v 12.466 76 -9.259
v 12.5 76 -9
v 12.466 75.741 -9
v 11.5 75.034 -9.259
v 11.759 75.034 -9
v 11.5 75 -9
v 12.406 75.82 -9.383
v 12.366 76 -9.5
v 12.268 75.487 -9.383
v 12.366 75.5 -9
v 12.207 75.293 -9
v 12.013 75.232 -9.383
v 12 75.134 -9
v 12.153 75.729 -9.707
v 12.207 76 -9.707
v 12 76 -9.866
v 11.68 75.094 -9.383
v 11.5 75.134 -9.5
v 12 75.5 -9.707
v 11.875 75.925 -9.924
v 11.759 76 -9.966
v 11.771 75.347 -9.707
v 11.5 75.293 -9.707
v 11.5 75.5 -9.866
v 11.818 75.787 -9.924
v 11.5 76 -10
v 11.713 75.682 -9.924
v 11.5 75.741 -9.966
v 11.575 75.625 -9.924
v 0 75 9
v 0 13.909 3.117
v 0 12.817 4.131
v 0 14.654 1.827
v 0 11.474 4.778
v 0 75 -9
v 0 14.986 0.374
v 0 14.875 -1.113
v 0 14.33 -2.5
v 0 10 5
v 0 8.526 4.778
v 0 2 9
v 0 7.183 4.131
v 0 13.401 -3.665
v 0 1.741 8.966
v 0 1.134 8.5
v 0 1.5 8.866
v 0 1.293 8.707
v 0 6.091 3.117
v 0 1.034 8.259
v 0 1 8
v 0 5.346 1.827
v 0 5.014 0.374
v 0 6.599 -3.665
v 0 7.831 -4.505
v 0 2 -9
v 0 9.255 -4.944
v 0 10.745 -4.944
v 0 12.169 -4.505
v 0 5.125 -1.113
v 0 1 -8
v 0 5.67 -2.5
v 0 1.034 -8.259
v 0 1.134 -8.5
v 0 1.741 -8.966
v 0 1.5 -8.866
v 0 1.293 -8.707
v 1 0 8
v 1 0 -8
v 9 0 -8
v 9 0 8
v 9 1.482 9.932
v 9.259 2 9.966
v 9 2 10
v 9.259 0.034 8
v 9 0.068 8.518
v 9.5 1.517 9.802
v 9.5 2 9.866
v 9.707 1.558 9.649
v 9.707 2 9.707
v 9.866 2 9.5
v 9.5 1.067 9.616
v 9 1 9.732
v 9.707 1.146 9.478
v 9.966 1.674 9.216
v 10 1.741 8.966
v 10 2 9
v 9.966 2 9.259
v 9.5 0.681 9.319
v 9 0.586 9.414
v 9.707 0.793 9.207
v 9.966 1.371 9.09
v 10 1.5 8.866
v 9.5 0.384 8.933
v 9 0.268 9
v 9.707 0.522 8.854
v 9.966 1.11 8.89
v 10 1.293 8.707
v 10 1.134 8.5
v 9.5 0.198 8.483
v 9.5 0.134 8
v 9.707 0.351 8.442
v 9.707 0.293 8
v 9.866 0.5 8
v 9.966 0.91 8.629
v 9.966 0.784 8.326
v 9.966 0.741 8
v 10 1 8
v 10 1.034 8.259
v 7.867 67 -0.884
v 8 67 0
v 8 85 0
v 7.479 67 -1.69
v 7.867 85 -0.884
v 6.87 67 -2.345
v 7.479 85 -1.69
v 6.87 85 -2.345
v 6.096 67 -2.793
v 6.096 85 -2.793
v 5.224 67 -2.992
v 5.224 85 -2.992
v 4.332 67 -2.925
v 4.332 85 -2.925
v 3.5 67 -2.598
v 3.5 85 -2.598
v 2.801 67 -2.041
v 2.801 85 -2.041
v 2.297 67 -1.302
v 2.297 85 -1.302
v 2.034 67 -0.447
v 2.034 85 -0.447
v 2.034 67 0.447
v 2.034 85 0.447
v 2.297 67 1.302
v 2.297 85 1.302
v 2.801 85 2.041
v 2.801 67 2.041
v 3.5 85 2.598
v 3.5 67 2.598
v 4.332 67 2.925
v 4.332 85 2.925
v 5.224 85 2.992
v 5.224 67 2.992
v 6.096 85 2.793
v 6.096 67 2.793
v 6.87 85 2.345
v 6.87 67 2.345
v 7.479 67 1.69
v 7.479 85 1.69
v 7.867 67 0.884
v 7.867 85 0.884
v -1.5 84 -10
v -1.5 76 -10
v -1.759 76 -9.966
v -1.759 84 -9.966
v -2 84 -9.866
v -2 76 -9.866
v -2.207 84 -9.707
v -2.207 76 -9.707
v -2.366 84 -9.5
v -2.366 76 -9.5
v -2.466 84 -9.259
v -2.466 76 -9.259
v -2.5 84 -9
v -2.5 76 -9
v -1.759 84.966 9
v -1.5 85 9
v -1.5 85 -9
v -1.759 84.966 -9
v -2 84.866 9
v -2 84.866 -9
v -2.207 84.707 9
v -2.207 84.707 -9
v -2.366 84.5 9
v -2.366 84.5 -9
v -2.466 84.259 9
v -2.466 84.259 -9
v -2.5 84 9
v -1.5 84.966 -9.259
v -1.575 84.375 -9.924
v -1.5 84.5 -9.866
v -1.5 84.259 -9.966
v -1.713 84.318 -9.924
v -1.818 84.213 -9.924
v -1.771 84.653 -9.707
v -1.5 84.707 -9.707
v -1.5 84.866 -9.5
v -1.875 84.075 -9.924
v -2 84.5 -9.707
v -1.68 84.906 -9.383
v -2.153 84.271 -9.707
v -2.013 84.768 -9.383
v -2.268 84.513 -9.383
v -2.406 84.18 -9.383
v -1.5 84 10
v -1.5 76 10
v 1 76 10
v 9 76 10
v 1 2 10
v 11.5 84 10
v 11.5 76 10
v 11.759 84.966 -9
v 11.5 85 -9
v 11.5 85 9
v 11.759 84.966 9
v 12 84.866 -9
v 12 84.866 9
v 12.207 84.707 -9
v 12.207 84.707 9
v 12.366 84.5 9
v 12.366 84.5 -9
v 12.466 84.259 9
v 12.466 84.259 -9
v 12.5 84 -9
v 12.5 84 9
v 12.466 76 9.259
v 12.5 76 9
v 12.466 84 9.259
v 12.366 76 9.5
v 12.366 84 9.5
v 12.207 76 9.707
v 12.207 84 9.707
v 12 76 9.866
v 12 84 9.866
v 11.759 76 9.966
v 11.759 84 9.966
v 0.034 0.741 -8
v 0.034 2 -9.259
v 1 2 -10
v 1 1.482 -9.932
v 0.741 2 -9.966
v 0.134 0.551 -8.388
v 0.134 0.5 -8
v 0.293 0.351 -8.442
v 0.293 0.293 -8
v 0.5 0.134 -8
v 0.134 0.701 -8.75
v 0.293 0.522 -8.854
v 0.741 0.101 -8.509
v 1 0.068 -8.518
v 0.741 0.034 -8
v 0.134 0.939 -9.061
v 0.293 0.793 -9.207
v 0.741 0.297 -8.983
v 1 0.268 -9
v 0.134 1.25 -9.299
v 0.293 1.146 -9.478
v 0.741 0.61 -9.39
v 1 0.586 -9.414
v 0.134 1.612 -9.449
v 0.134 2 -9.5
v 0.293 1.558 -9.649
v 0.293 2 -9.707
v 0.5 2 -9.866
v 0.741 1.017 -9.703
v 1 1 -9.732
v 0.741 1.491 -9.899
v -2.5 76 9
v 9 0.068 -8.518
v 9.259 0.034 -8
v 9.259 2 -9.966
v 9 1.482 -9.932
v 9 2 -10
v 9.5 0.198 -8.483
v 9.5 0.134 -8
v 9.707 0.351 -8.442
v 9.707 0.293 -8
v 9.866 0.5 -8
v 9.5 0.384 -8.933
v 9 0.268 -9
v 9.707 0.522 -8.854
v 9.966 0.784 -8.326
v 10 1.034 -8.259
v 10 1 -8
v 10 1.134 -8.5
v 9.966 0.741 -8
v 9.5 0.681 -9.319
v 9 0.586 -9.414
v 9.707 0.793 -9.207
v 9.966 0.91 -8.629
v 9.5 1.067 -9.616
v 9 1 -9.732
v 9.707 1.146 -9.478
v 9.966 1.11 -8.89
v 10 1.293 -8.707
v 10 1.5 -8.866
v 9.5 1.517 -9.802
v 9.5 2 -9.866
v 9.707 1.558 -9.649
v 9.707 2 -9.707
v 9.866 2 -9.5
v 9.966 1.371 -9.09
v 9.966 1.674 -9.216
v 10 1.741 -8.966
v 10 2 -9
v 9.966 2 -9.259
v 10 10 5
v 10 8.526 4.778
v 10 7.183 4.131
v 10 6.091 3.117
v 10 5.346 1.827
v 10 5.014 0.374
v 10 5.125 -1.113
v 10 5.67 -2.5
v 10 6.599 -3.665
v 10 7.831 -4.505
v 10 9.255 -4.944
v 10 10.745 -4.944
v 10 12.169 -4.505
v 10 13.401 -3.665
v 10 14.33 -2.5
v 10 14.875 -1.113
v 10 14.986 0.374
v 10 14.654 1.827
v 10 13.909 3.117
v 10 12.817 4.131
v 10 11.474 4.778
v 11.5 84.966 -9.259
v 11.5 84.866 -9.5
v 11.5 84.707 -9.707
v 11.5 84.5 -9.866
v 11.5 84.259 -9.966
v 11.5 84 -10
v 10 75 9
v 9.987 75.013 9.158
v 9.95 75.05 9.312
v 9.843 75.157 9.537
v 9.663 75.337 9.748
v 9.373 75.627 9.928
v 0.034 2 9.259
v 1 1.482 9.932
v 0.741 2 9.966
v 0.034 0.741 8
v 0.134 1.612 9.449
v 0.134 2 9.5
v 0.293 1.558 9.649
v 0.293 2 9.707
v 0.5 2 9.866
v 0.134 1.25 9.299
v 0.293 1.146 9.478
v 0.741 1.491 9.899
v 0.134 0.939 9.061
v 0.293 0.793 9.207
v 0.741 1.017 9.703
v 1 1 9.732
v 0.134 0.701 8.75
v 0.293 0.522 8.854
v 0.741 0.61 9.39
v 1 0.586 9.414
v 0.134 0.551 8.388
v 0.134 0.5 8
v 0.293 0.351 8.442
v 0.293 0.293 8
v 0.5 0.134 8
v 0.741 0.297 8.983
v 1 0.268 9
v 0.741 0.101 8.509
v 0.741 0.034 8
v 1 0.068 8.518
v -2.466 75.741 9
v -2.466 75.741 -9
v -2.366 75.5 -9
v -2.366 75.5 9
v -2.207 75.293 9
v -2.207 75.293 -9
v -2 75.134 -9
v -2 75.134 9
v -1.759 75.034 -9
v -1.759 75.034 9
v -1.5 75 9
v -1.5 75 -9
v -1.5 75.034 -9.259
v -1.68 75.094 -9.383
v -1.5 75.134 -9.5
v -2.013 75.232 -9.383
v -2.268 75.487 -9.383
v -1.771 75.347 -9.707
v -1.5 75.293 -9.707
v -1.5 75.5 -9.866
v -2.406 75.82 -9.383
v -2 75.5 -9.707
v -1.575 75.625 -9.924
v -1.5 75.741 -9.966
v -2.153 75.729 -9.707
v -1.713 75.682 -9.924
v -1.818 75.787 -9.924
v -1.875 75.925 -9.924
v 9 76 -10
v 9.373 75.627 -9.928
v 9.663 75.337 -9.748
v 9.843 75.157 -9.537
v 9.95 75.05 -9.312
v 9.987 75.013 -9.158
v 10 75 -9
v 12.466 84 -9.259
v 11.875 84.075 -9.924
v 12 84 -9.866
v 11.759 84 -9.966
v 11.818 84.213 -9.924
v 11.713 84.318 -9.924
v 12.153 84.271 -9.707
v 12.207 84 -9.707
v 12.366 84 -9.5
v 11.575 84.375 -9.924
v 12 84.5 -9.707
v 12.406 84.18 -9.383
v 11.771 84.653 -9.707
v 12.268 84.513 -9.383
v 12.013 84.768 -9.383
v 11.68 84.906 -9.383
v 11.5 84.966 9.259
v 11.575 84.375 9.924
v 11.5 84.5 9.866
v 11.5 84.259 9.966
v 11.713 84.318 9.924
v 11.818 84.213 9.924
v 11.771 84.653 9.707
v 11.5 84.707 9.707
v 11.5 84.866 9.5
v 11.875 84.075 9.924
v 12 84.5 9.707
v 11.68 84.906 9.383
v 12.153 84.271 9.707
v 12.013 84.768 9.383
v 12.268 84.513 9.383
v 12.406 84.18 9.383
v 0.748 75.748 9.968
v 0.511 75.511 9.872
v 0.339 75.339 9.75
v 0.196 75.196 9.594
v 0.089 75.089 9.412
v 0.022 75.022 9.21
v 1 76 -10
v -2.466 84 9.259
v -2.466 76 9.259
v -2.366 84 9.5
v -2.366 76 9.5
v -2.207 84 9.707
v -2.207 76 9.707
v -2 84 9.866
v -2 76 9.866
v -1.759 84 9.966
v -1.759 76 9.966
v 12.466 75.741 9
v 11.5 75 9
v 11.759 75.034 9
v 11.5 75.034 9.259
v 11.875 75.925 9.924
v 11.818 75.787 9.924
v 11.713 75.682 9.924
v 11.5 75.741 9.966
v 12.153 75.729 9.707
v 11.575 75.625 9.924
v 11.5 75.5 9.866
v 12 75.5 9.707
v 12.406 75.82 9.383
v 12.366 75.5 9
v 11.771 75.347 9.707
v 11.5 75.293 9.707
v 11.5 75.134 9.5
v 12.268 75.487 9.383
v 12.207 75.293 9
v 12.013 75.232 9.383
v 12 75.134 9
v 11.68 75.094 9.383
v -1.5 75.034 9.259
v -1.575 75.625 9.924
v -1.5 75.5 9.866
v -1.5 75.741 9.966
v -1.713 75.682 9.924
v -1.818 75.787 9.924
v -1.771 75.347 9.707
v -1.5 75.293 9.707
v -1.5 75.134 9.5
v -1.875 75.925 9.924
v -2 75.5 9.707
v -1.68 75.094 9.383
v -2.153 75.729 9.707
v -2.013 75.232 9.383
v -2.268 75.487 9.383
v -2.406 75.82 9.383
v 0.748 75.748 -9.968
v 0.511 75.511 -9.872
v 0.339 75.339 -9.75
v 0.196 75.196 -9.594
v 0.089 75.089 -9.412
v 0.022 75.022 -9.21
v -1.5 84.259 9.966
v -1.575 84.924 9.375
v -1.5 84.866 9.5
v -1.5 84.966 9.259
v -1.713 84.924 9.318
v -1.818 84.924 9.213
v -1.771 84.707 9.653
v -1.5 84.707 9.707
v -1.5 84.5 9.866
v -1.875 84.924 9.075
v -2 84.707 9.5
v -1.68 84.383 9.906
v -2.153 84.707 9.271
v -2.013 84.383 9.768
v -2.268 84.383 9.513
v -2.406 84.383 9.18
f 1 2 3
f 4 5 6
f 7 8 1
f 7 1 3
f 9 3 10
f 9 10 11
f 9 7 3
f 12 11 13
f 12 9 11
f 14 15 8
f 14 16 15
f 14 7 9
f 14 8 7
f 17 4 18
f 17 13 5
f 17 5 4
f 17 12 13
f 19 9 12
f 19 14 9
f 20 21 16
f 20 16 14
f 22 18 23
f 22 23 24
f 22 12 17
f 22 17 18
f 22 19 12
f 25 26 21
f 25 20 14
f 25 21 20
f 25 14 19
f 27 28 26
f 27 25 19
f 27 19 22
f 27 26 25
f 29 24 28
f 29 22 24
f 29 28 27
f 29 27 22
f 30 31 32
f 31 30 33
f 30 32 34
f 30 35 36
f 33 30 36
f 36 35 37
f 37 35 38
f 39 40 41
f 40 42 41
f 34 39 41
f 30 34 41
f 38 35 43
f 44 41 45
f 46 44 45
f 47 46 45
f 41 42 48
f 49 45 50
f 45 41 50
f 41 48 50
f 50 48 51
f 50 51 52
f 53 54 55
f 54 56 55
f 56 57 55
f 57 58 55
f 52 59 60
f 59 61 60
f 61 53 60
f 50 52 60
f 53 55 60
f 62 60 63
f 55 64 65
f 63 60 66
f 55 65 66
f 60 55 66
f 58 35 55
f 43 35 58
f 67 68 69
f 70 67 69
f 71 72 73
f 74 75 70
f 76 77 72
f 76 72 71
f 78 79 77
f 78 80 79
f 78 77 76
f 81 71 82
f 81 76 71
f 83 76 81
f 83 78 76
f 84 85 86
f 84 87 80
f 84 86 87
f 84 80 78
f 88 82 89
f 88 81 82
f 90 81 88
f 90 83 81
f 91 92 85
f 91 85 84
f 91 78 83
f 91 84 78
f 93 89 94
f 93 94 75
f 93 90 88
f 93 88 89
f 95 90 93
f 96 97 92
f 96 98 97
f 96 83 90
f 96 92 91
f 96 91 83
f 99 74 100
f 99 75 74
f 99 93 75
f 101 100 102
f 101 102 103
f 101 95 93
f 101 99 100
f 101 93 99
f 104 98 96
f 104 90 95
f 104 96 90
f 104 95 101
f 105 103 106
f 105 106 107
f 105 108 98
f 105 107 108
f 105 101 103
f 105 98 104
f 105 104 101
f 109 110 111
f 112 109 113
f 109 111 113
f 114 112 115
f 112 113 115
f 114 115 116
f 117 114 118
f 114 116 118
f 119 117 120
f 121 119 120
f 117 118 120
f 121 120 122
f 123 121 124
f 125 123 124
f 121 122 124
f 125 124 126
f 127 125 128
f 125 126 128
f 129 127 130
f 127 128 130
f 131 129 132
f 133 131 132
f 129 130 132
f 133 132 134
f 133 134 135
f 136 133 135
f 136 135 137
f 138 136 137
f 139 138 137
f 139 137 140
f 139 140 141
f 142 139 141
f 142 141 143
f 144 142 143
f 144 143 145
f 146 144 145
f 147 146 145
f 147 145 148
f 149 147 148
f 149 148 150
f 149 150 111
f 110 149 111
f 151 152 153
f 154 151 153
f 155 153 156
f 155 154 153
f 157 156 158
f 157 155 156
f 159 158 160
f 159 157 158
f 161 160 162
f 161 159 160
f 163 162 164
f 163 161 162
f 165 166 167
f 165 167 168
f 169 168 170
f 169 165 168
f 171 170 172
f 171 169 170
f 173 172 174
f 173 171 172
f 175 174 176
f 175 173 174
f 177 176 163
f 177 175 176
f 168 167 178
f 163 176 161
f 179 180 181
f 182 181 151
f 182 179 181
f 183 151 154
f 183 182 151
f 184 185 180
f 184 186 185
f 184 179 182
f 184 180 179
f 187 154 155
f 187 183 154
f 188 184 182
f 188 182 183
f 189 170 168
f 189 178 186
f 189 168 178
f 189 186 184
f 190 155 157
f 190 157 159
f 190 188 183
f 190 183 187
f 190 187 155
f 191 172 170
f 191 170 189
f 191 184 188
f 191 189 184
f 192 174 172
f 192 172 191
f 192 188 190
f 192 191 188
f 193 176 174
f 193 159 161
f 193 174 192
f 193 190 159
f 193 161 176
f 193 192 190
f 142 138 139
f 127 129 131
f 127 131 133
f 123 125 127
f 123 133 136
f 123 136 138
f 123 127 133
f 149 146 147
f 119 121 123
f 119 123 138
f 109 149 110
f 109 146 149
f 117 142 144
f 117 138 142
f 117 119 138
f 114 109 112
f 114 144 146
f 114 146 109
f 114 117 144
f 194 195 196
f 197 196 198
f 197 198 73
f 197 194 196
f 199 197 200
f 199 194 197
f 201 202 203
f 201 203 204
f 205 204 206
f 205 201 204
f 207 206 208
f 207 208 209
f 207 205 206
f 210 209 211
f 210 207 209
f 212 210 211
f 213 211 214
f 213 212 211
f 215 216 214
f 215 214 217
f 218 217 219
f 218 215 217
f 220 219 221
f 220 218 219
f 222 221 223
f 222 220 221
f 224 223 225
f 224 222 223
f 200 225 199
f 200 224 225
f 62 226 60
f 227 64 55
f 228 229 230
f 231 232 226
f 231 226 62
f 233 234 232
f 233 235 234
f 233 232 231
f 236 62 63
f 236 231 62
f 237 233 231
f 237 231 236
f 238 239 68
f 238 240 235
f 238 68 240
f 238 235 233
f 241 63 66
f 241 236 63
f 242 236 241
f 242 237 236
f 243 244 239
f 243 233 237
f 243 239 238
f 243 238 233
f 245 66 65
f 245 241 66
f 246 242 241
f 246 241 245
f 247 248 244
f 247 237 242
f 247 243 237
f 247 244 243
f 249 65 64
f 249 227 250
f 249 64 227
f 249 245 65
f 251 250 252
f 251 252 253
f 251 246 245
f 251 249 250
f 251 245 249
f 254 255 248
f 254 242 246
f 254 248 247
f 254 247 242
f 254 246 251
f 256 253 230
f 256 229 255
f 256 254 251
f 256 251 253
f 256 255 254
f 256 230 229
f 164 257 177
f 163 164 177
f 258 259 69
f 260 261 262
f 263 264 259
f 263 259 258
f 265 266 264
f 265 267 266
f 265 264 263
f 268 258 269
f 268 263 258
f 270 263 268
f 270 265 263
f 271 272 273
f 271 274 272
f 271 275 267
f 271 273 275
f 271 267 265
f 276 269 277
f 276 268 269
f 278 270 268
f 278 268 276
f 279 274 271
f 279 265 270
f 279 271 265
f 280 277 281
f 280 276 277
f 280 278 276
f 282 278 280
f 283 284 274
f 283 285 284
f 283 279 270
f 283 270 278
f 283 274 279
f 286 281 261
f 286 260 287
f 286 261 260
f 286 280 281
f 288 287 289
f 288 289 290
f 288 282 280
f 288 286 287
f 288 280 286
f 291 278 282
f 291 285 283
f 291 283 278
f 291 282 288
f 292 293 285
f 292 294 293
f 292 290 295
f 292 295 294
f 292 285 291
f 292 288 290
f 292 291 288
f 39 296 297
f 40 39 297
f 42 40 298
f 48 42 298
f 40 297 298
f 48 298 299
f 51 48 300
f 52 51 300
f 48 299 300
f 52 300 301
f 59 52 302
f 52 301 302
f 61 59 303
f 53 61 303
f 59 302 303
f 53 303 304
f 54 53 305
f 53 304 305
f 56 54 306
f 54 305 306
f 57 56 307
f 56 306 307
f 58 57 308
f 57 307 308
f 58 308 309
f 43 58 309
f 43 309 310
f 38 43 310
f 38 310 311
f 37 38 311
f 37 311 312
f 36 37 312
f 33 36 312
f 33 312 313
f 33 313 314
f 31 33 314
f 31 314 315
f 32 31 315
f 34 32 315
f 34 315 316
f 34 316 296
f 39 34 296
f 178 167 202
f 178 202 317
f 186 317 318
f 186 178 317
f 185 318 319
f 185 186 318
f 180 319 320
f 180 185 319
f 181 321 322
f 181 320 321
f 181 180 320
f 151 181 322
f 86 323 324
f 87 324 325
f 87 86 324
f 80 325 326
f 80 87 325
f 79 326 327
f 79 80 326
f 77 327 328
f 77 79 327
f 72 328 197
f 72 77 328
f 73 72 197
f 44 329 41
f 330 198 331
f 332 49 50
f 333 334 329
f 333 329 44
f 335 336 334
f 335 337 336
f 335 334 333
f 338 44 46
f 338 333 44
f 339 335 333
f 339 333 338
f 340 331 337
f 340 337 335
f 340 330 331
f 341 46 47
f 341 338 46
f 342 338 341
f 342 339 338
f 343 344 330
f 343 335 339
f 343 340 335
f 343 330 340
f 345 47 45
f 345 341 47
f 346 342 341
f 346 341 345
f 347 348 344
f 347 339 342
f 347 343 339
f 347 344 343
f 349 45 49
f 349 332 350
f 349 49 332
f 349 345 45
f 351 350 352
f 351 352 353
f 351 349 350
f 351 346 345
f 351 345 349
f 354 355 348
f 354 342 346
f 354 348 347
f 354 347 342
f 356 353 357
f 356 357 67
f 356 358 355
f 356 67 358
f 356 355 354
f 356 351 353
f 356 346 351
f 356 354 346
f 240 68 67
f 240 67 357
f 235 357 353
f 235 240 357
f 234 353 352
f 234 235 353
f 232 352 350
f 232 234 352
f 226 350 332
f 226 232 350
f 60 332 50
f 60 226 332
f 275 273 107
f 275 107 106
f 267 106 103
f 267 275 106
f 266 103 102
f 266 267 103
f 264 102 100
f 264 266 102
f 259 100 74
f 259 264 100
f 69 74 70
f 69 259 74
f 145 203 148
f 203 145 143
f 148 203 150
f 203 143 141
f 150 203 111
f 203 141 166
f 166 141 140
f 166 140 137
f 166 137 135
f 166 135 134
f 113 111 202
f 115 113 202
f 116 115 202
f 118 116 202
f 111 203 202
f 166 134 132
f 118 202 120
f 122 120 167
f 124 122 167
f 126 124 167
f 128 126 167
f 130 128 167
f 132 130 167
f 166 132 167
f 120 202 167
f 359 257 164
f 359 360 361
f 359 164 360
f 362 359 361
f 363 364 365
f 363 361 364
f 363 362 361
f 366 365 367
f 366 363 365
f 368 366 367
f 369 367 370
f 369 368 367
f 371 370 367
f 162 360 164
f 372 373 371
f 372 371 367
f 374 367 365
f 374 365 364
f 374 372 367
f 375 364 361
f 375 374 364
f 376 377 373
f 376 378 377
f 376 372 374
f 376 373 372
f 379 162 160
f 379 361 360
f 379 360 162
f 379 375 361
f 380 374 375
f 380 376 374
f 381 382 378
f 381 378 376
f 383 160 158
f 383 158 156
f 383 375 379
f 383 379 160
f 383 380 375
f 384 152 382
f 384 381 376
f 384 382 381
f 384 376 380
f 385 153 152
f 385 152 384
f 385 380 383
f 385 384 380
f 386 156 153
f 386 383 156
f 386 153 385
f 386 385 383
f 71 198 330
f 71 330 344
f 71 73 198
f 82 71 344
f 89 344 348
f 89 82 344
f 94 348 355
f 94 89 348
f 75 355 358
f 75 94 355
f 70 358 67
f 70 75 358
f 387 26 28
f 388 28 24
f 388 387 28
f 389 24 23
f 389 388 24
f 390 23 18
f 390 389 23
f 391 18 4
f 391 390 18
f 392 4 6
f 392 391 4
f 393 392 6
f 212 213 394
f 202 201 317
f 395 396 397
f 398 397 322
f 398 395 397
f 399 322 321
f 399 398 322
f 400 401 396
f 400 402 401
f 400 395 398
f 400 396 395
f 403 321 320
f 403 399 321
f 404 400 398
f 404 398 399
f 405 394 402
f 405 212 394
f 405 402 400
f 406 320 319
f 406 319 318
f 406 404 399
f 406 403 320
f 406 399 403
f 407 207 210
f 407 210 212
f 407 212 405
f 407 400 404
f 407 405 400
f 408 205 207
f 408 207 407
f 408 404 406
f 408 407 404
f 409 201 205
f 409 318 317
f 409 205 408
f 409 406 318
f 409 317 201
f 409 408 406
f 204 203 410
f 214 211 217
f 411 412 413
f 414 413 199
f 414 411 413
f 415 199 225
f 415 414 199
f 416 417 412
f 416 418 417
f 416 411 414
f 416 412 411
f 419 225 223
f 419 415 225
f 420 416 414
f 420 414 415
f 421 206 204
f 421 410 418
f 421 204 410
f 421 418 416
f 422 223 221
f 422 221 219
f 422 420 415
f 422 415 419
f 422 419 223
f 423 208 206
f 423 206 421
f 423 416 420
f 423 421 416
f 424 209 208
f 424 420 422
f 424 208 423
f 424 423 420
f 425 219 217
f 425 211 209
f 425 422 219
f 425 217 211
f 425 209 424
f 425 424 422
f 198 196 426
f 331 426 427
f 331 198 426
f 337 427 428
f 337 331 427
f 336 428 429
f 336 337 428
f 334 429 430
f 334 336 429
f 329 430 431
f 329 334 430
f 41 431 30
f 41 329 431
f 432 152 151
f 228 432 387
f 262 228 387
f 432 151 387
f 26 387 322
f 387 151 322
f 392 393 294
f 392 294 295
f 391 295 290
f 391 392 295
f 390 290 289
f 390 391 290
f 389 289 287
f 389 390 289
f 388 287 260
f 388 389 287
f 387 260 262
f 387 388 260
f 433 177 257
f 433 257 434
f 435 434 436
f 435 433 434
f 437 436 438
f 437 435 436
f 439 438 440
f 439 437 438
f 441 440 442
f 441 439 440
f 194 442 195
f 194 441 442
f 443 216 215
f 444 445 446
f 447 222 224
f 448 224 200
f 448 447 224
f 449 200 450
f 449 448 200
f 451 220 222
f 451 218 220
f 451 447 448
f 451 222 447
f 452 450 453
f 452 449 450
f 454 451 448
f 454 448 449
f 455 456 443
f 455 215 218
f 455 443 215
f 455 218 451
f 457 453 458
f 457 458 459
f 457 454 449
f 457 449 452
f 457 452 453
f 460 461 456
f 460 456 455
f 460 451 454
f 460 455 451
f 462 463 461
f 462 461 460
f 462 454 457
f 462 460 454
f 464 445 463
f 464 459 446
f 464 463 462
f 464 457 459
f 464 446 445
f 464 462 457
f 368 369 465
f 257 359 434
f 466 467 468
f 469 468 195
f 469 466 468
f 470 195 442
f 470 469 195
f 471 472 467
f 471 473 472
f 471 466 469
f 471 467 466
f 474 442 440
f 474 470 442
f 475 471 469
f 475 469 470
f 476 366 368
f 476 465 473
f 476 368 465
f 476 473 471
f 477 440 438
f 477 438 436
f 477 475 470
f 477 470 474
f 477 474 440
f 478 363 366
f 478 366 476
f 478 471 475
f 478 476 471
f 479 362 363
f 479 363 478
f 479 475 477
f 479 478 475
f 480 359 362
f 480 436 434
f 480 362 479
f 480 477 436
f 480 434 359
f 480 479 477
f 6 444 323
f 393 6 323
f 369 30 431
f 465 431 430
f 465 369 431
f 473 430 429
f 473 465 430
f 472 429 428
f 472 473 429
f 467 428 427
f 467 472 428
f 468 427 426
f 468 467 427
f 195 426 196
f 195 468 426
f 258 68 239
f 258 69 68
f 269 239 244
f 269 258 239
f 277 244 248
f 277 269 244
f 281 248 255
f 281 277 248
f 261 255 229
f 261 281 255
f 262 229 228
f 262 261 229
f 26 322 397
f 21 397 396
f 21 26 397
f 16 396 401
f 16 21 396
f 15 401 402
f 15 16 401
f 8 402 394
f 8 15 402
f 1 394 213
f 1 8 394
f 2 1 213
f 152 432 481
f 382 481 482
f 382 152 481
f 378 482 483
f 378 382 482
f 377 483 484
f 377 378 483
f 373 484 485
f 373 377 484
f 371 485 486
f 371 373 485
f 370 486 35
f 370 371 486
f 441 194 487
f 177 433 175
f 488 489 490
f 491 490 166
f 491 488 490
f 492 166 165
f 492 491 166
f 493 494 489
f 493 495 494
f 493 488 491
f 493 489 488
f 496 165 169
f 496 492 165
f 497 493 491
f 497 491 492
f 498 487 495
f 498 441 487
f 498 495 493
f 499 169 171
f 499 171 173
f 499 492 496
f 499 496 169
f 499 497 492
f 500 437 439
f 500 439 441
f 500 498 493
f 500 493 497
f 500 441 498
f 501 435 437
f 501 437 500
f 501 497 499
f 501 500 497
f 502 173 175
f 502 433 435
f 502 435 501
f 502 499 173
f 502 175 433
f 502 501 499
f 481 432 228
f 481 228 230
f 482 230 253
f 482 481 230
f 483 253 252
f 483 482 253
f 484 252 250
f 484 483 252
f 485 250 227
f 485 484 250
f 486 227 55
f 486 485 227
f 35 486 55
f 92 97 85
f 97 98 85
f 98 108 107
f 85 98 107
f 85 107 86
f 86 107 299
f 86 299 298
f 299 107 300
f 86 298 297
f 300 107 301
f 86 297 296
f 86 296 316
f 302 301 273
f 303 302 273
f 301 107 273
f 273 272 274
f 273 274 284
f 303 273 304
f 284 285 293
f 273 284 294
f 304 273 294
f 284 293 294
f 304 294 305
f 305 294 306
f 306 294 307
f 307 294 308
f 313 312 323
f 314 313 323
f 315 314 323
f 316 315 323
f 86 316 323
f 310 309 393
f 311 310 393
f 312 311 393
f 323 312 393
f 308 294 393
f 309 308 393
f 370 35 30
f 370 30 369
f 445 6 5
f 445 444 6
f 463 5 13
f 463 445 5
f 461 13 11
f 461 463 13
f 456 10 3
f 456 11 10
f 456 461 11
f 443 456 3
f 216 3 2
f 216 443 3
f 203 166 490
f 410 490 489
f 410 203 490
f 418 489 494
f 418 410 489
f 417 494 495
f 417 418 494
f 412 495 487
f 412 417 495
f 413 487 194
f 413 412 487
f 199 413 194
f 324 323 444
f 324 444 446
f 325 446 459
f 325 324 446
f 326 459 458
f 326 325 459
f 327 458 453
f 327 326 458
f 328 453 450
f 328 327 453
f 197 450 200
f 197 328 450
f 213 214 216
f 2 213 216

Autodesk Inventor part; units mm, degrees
ref_plane "YZ Plane" through (0, 0, 0) normal (1, 0, 0) x (0, 1, 0)
ref_plane "XZ Plane" through (0, 0, 0) normal (0, 1, 0) x (-1, 0, 0)
ref_plane "XY Plane" through (0, 0, 0) normal (0, 0, 1) x (1, 0, 0)
sketch "Sketch1" plane through (0, 0, 0) normal (0, 0, 1) x (1, 0, 0)
  line L0 (0, 0) -> (10, 0)
  line L1 (10, 0) -> (10, 85)
  line L2 (10, 85) -> (0, 85)
  line L3 (0, 85) -> (0, 0)
  dimension "d0" = 10
  dimension "d1" = 85
extrude "Extrusion1" add sketch "Sketch1" along normal mid plane 20
sketch "Sketch2" plane through (0, 0, 10) normal (-1, 0, 0) x (0, 0, 1)
  line L0 (-20, 0) -> (-20, 85) projected
  line L1 (-20, 0) -> (0, 0) projected
  line L2 (0, 85) -> (0, 0) projected
  point P0 (-10, 0)
  point P1 (-10, 10)
  point P2 (-10, 0)
  dimension "d14" = 10
  dimension "d15" = 10
hole "Hole1" at (0, 10, 0) direction (1, 0, 0) diameter 10 end through all
fillet "Fillet1" radius 2 2 edges at (5, 0, -10) (5, 0, 10)
sketch "Sketch4" plane through (0, 0, 0) normal (0, 0, 1) x (1, 0, 0)
  line L0 (-2.5, 85) -> (12.5, 85)
  line L1 (12.5, 85) -> (12.5, 75)
  line L2 (12.5, 75) -> (-2.5, 75)
  line L3 (-2.5, 75) -> (-2.5, 85)
  line L4 (10, 85) -> (0, 85) projected
  point P0 (0, 0)
  point P1 (5, 85)
  point P2 (5, 85)
  dimension "d27" = 15
  dimension "d28" = 10
  dimension "d29" = 7.5
  dimension "d32" = 0
extrude "Extrusion3" add sketch "Sketch4" along normal mid plane 20
sketch "Sketch3" plane through (0, 85, 10) normal (0, 1, 0) x (1, 0, 0)
  circle A0 centre (5, 10) radius 3
  point P0 (0, 10)
  dimension "d24" = 6
extrude "Extrusion2" cut sketch "Sketch3" along normal blind 20 and the other way blind 18
fillet "Fillet2" radius 1 2 edges at (-2.5, 75, 0) (12.5, 75, 0)
fillet "Fillet3" radius 1 22 edges at (10, 0.5858, 9.4142) (10, 0, 0) (10, 0.5858, -9.4142) (10, 38.5, -10) (10, 38.5, 10) (0, 0.5858, 9.4142) (0, 0, 0) (0, 0.5858, -9.4142) (0, 38.5, -10) (0, 38.5, 10) (-0.75, 75, 10) (-2.5, 80.5, 10) (12.5, 85, 0) (-2.5, 85, 0) (5, 85, 10) (5, 85, -10) (10.75, 75, -10) (12.5, 80.5, -10) (10.75, 75, 10) (12.5, 80.5, 10) (-0.75, 75, -10) (-2.5, 80.5, -10)
equation "\"d15\" = d14"
equation "\"d29\" = 0.5 * d27"
properties part number "Suporte da base movel"
